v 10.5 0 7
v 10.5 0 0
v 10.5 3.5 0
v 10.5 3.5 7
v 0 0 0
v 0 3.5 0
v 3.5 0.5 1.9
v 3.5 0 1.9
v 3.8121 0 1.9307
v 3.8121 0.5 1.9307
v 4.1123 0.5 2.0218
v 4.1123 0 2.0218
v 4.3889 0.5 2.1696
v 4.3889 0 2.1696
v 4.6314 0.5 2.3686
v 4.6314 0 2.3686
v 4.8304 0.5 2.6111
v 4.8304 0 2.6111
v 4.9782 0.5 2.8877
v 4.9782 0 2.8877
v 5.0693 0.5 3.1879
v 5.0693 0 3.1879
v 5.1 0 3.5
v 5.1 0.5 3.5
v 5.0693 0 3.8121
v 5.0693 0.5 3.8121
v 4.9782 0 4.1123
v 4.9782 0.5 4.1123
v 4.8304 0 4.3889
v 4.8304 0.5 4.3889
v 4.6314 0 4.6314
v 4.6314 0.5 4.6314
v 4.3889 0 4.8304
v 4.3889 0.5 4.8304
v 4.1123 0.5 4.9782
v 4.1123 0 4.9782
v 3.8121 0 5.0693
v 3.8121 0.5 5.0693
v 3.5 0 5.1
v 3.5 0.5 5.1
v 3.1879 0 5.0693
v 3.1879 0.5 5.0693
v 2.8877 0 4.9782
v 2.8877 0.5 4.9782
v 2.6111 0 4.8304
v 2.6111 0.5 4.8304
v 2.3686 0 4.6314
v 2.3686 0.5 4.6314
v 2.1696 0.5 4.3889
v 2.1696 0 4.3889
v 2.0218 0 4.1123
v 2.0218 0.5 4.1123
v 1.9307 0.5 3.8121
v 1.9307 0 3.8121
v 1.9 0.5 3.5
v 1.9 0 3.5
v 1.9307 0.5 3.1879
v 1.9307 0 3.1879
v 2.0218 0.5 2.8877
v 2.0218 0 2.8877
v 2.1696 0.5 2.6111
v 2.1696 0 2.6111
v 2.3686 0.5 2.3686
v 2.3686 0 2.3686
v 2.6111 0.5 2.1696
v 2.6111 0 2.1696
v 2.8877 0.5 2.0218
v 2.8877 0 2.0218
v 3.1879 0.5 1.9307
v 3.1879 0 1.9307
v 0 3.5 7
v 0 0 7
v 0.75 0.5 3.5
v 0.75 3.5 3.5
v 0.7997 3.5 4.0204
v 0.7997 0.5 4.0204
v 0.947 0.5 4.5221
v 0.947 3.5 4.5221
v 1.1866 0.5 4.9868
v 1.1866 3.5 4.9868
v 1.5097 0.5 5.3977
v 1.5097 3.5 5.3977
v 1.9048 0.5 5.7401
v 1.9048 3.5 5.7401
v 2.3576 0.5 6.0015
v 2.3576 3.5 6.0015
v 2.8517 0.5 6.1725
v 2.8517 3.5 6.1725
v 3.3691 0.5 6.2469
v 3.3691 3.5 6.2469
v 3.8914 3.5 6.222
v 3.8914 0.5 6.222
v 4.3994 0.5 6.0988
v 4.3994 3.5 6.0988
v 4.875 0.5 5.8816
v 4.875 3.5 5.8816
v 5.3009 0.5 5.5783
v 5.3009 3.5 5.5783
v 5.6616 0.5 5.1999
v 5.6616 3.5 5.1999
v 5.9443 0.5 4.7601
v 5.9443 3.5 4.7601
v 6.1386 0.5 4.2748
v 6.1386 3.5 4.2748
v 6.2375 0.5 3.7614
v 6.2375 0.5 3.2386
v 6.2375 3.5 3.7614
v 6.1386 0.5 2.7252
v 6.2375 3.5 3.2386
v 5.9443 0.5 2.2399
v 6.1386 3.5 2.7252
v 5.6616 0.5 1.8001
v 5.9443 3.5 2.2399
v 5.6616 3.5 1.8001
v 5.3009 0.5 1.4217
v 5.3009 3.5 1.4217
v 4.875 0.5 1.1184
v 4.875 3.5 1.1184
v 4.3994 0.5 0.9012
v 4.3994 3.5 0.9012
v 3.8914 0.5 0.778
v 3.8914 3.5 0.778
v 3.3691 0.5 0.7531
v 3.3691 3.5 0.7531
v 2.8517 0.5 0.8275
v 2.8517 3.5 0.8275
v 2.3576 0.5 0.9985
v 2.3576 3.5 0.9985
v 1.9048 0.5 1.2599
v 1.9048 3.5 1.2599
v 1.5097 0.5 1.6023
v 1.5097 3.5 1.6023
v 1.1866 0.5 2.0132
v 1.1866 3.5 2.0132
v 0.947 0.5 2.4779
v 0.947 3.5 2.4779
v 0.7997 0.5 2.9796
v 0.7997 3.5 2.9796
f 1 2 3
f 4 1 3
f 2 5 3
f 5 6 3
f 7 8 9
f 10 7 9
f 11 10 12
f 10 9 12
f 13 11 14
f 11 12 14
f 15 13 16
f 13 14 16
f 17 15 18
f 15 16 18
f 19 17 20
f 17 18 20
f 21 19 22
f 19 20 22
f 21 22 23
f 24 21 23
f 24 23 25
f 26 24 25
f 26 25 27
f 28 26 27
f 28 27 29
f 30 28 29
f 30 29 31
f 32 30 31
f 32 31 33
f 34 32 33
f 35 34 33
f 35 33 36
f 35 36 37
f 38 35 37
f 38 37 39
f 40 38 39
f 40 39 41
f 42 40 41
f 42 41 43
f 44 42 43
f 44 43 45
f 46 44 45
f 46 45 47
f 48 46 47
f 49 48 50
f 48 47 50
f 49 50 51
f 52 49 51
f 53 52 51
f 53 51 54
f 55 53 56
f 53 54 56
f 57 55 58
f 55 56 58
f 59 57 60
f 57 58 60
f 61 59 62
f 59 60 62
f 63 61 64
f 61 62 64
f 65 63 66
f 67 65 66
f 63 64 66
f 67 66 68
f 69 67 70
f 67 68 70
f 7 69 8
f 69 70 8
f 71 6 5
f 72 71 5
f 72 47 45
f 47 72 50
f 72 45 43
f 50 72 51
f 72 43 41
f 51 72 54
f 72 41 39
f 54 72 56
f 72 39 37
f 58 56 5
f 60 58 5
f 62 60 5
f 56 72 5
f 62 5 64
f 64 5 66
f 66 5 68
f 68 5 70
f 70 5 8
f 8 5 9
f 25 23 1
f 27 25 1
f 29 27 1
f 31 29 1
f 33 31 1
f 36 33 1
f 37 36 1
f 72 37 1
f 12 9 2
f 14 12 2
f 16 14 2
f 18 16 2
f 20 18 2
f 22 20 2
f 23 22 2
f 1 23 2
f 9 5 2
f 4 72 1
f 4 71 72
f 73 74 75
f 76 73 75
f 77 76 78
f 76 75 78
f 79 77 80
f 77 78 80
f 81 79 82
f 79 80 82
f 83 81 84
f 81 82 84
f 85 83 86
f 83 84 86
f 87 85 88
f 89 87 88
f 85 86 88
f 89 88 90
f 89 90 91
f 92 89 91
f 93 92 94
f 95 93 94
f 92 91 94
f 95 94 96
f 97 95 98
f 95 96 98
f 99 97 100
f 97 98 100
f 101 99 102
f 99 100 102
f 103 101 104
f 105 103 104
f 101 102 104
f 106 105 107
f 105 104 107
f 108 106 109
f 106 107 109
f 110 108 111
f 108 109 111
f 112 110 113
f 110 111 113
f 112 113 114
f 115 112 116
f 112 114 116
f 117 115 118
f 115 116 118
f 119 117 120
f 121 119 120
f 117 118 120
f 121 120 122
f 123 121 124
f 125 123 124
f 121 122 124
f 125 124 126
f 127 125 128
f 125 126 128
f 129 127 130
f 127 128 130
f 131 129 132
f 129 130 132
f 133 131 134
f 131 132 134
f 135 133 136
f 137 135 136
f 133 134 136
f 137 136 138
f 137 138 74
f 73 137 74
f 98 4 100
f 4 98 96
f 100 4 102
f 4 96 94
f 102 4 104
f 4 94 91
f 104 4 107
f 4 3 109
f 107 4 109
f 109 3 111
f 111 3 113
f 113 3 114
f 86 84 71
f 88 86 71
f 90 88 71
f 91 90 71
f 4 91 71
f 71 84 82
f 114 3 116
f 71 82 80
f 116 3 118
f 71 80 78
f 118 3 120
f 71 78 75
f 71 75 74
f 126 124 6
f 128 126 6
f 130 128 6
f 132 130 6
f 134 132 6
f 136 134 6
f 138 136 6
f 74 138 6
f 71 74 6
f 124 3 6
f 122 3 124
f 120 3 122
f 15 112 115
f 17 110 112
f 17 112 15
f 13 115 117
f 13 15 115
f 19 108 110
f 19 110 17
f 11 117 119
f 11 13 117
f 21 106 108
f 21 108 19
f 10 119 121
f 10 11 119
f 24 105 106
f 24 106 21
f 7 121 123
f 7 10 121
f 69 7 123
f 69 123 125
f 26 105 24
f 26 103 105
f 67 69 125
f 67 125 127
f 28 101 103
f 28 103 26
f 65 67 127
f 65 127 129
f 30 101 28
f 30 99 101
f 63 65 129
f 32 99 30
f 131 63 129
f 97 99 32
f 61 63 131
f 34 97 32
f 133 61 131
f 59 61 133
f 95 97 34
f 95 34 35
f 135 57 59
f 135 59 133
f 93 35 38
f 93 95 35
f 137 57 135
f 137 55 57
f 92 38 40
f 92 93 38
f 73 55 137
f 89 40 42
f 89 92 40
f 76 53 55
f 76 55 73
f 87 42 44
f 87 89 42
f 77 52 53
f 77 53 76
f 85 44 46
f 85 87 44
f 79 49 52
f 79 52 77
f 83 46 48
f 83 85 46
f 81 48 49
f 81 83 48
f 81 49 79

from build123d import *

# Parameters (mm, degrees)
SALIENTE_EXTRUIR1_DEPTH = 7
CROQUIS2_R              = 1.6
CORTAR_EXTRUIR1_DEPTH   = 6
CROQUIS3_R              = 2.75
CORTAR_EXTRUIR2_DEPTH   = 3


with BuildPart() as part:
    # Croquis1 → Saliente-Extruir1 (new body)
    with BuildSketch(Plane.XY):
        Polygon((0, 0), (7, 0), (10.5, 0), (10.5, 3.5), (0, 3.5), align=None)
    extrude(amount=SALIENTE_EXTRUIR1_DEPTH)

    # Croquis2 → Cortar-Extruir1 (cut)
    with BuildSketch(Plane.XZ):
        with Locations(Location((3.5, 3.5, 0), (0, 0, 270))):
            Circle(CROQUIS2_R)
    extrude(amount=-CORTAR_EXTRUIR1_DEPTH, mode=Mode.SUBTRACT)

    # Croquis3 → Cortar-Extruir2 (cut)
    with BuildSketch(Plane(origin=(0, 3.5, 0), x_dir=(1, 0, 0), z_dir=(0, 1, 0))):
        with Locations(Location((3.5, -3.5, 0), (0, 0, 180))):
            Circle(CROQUIS3_R)
    extrude(amount=-CORTAR_EXTRUIR2_DEPTH, mode=Mode.SUBTRACT)


solid = part.part
